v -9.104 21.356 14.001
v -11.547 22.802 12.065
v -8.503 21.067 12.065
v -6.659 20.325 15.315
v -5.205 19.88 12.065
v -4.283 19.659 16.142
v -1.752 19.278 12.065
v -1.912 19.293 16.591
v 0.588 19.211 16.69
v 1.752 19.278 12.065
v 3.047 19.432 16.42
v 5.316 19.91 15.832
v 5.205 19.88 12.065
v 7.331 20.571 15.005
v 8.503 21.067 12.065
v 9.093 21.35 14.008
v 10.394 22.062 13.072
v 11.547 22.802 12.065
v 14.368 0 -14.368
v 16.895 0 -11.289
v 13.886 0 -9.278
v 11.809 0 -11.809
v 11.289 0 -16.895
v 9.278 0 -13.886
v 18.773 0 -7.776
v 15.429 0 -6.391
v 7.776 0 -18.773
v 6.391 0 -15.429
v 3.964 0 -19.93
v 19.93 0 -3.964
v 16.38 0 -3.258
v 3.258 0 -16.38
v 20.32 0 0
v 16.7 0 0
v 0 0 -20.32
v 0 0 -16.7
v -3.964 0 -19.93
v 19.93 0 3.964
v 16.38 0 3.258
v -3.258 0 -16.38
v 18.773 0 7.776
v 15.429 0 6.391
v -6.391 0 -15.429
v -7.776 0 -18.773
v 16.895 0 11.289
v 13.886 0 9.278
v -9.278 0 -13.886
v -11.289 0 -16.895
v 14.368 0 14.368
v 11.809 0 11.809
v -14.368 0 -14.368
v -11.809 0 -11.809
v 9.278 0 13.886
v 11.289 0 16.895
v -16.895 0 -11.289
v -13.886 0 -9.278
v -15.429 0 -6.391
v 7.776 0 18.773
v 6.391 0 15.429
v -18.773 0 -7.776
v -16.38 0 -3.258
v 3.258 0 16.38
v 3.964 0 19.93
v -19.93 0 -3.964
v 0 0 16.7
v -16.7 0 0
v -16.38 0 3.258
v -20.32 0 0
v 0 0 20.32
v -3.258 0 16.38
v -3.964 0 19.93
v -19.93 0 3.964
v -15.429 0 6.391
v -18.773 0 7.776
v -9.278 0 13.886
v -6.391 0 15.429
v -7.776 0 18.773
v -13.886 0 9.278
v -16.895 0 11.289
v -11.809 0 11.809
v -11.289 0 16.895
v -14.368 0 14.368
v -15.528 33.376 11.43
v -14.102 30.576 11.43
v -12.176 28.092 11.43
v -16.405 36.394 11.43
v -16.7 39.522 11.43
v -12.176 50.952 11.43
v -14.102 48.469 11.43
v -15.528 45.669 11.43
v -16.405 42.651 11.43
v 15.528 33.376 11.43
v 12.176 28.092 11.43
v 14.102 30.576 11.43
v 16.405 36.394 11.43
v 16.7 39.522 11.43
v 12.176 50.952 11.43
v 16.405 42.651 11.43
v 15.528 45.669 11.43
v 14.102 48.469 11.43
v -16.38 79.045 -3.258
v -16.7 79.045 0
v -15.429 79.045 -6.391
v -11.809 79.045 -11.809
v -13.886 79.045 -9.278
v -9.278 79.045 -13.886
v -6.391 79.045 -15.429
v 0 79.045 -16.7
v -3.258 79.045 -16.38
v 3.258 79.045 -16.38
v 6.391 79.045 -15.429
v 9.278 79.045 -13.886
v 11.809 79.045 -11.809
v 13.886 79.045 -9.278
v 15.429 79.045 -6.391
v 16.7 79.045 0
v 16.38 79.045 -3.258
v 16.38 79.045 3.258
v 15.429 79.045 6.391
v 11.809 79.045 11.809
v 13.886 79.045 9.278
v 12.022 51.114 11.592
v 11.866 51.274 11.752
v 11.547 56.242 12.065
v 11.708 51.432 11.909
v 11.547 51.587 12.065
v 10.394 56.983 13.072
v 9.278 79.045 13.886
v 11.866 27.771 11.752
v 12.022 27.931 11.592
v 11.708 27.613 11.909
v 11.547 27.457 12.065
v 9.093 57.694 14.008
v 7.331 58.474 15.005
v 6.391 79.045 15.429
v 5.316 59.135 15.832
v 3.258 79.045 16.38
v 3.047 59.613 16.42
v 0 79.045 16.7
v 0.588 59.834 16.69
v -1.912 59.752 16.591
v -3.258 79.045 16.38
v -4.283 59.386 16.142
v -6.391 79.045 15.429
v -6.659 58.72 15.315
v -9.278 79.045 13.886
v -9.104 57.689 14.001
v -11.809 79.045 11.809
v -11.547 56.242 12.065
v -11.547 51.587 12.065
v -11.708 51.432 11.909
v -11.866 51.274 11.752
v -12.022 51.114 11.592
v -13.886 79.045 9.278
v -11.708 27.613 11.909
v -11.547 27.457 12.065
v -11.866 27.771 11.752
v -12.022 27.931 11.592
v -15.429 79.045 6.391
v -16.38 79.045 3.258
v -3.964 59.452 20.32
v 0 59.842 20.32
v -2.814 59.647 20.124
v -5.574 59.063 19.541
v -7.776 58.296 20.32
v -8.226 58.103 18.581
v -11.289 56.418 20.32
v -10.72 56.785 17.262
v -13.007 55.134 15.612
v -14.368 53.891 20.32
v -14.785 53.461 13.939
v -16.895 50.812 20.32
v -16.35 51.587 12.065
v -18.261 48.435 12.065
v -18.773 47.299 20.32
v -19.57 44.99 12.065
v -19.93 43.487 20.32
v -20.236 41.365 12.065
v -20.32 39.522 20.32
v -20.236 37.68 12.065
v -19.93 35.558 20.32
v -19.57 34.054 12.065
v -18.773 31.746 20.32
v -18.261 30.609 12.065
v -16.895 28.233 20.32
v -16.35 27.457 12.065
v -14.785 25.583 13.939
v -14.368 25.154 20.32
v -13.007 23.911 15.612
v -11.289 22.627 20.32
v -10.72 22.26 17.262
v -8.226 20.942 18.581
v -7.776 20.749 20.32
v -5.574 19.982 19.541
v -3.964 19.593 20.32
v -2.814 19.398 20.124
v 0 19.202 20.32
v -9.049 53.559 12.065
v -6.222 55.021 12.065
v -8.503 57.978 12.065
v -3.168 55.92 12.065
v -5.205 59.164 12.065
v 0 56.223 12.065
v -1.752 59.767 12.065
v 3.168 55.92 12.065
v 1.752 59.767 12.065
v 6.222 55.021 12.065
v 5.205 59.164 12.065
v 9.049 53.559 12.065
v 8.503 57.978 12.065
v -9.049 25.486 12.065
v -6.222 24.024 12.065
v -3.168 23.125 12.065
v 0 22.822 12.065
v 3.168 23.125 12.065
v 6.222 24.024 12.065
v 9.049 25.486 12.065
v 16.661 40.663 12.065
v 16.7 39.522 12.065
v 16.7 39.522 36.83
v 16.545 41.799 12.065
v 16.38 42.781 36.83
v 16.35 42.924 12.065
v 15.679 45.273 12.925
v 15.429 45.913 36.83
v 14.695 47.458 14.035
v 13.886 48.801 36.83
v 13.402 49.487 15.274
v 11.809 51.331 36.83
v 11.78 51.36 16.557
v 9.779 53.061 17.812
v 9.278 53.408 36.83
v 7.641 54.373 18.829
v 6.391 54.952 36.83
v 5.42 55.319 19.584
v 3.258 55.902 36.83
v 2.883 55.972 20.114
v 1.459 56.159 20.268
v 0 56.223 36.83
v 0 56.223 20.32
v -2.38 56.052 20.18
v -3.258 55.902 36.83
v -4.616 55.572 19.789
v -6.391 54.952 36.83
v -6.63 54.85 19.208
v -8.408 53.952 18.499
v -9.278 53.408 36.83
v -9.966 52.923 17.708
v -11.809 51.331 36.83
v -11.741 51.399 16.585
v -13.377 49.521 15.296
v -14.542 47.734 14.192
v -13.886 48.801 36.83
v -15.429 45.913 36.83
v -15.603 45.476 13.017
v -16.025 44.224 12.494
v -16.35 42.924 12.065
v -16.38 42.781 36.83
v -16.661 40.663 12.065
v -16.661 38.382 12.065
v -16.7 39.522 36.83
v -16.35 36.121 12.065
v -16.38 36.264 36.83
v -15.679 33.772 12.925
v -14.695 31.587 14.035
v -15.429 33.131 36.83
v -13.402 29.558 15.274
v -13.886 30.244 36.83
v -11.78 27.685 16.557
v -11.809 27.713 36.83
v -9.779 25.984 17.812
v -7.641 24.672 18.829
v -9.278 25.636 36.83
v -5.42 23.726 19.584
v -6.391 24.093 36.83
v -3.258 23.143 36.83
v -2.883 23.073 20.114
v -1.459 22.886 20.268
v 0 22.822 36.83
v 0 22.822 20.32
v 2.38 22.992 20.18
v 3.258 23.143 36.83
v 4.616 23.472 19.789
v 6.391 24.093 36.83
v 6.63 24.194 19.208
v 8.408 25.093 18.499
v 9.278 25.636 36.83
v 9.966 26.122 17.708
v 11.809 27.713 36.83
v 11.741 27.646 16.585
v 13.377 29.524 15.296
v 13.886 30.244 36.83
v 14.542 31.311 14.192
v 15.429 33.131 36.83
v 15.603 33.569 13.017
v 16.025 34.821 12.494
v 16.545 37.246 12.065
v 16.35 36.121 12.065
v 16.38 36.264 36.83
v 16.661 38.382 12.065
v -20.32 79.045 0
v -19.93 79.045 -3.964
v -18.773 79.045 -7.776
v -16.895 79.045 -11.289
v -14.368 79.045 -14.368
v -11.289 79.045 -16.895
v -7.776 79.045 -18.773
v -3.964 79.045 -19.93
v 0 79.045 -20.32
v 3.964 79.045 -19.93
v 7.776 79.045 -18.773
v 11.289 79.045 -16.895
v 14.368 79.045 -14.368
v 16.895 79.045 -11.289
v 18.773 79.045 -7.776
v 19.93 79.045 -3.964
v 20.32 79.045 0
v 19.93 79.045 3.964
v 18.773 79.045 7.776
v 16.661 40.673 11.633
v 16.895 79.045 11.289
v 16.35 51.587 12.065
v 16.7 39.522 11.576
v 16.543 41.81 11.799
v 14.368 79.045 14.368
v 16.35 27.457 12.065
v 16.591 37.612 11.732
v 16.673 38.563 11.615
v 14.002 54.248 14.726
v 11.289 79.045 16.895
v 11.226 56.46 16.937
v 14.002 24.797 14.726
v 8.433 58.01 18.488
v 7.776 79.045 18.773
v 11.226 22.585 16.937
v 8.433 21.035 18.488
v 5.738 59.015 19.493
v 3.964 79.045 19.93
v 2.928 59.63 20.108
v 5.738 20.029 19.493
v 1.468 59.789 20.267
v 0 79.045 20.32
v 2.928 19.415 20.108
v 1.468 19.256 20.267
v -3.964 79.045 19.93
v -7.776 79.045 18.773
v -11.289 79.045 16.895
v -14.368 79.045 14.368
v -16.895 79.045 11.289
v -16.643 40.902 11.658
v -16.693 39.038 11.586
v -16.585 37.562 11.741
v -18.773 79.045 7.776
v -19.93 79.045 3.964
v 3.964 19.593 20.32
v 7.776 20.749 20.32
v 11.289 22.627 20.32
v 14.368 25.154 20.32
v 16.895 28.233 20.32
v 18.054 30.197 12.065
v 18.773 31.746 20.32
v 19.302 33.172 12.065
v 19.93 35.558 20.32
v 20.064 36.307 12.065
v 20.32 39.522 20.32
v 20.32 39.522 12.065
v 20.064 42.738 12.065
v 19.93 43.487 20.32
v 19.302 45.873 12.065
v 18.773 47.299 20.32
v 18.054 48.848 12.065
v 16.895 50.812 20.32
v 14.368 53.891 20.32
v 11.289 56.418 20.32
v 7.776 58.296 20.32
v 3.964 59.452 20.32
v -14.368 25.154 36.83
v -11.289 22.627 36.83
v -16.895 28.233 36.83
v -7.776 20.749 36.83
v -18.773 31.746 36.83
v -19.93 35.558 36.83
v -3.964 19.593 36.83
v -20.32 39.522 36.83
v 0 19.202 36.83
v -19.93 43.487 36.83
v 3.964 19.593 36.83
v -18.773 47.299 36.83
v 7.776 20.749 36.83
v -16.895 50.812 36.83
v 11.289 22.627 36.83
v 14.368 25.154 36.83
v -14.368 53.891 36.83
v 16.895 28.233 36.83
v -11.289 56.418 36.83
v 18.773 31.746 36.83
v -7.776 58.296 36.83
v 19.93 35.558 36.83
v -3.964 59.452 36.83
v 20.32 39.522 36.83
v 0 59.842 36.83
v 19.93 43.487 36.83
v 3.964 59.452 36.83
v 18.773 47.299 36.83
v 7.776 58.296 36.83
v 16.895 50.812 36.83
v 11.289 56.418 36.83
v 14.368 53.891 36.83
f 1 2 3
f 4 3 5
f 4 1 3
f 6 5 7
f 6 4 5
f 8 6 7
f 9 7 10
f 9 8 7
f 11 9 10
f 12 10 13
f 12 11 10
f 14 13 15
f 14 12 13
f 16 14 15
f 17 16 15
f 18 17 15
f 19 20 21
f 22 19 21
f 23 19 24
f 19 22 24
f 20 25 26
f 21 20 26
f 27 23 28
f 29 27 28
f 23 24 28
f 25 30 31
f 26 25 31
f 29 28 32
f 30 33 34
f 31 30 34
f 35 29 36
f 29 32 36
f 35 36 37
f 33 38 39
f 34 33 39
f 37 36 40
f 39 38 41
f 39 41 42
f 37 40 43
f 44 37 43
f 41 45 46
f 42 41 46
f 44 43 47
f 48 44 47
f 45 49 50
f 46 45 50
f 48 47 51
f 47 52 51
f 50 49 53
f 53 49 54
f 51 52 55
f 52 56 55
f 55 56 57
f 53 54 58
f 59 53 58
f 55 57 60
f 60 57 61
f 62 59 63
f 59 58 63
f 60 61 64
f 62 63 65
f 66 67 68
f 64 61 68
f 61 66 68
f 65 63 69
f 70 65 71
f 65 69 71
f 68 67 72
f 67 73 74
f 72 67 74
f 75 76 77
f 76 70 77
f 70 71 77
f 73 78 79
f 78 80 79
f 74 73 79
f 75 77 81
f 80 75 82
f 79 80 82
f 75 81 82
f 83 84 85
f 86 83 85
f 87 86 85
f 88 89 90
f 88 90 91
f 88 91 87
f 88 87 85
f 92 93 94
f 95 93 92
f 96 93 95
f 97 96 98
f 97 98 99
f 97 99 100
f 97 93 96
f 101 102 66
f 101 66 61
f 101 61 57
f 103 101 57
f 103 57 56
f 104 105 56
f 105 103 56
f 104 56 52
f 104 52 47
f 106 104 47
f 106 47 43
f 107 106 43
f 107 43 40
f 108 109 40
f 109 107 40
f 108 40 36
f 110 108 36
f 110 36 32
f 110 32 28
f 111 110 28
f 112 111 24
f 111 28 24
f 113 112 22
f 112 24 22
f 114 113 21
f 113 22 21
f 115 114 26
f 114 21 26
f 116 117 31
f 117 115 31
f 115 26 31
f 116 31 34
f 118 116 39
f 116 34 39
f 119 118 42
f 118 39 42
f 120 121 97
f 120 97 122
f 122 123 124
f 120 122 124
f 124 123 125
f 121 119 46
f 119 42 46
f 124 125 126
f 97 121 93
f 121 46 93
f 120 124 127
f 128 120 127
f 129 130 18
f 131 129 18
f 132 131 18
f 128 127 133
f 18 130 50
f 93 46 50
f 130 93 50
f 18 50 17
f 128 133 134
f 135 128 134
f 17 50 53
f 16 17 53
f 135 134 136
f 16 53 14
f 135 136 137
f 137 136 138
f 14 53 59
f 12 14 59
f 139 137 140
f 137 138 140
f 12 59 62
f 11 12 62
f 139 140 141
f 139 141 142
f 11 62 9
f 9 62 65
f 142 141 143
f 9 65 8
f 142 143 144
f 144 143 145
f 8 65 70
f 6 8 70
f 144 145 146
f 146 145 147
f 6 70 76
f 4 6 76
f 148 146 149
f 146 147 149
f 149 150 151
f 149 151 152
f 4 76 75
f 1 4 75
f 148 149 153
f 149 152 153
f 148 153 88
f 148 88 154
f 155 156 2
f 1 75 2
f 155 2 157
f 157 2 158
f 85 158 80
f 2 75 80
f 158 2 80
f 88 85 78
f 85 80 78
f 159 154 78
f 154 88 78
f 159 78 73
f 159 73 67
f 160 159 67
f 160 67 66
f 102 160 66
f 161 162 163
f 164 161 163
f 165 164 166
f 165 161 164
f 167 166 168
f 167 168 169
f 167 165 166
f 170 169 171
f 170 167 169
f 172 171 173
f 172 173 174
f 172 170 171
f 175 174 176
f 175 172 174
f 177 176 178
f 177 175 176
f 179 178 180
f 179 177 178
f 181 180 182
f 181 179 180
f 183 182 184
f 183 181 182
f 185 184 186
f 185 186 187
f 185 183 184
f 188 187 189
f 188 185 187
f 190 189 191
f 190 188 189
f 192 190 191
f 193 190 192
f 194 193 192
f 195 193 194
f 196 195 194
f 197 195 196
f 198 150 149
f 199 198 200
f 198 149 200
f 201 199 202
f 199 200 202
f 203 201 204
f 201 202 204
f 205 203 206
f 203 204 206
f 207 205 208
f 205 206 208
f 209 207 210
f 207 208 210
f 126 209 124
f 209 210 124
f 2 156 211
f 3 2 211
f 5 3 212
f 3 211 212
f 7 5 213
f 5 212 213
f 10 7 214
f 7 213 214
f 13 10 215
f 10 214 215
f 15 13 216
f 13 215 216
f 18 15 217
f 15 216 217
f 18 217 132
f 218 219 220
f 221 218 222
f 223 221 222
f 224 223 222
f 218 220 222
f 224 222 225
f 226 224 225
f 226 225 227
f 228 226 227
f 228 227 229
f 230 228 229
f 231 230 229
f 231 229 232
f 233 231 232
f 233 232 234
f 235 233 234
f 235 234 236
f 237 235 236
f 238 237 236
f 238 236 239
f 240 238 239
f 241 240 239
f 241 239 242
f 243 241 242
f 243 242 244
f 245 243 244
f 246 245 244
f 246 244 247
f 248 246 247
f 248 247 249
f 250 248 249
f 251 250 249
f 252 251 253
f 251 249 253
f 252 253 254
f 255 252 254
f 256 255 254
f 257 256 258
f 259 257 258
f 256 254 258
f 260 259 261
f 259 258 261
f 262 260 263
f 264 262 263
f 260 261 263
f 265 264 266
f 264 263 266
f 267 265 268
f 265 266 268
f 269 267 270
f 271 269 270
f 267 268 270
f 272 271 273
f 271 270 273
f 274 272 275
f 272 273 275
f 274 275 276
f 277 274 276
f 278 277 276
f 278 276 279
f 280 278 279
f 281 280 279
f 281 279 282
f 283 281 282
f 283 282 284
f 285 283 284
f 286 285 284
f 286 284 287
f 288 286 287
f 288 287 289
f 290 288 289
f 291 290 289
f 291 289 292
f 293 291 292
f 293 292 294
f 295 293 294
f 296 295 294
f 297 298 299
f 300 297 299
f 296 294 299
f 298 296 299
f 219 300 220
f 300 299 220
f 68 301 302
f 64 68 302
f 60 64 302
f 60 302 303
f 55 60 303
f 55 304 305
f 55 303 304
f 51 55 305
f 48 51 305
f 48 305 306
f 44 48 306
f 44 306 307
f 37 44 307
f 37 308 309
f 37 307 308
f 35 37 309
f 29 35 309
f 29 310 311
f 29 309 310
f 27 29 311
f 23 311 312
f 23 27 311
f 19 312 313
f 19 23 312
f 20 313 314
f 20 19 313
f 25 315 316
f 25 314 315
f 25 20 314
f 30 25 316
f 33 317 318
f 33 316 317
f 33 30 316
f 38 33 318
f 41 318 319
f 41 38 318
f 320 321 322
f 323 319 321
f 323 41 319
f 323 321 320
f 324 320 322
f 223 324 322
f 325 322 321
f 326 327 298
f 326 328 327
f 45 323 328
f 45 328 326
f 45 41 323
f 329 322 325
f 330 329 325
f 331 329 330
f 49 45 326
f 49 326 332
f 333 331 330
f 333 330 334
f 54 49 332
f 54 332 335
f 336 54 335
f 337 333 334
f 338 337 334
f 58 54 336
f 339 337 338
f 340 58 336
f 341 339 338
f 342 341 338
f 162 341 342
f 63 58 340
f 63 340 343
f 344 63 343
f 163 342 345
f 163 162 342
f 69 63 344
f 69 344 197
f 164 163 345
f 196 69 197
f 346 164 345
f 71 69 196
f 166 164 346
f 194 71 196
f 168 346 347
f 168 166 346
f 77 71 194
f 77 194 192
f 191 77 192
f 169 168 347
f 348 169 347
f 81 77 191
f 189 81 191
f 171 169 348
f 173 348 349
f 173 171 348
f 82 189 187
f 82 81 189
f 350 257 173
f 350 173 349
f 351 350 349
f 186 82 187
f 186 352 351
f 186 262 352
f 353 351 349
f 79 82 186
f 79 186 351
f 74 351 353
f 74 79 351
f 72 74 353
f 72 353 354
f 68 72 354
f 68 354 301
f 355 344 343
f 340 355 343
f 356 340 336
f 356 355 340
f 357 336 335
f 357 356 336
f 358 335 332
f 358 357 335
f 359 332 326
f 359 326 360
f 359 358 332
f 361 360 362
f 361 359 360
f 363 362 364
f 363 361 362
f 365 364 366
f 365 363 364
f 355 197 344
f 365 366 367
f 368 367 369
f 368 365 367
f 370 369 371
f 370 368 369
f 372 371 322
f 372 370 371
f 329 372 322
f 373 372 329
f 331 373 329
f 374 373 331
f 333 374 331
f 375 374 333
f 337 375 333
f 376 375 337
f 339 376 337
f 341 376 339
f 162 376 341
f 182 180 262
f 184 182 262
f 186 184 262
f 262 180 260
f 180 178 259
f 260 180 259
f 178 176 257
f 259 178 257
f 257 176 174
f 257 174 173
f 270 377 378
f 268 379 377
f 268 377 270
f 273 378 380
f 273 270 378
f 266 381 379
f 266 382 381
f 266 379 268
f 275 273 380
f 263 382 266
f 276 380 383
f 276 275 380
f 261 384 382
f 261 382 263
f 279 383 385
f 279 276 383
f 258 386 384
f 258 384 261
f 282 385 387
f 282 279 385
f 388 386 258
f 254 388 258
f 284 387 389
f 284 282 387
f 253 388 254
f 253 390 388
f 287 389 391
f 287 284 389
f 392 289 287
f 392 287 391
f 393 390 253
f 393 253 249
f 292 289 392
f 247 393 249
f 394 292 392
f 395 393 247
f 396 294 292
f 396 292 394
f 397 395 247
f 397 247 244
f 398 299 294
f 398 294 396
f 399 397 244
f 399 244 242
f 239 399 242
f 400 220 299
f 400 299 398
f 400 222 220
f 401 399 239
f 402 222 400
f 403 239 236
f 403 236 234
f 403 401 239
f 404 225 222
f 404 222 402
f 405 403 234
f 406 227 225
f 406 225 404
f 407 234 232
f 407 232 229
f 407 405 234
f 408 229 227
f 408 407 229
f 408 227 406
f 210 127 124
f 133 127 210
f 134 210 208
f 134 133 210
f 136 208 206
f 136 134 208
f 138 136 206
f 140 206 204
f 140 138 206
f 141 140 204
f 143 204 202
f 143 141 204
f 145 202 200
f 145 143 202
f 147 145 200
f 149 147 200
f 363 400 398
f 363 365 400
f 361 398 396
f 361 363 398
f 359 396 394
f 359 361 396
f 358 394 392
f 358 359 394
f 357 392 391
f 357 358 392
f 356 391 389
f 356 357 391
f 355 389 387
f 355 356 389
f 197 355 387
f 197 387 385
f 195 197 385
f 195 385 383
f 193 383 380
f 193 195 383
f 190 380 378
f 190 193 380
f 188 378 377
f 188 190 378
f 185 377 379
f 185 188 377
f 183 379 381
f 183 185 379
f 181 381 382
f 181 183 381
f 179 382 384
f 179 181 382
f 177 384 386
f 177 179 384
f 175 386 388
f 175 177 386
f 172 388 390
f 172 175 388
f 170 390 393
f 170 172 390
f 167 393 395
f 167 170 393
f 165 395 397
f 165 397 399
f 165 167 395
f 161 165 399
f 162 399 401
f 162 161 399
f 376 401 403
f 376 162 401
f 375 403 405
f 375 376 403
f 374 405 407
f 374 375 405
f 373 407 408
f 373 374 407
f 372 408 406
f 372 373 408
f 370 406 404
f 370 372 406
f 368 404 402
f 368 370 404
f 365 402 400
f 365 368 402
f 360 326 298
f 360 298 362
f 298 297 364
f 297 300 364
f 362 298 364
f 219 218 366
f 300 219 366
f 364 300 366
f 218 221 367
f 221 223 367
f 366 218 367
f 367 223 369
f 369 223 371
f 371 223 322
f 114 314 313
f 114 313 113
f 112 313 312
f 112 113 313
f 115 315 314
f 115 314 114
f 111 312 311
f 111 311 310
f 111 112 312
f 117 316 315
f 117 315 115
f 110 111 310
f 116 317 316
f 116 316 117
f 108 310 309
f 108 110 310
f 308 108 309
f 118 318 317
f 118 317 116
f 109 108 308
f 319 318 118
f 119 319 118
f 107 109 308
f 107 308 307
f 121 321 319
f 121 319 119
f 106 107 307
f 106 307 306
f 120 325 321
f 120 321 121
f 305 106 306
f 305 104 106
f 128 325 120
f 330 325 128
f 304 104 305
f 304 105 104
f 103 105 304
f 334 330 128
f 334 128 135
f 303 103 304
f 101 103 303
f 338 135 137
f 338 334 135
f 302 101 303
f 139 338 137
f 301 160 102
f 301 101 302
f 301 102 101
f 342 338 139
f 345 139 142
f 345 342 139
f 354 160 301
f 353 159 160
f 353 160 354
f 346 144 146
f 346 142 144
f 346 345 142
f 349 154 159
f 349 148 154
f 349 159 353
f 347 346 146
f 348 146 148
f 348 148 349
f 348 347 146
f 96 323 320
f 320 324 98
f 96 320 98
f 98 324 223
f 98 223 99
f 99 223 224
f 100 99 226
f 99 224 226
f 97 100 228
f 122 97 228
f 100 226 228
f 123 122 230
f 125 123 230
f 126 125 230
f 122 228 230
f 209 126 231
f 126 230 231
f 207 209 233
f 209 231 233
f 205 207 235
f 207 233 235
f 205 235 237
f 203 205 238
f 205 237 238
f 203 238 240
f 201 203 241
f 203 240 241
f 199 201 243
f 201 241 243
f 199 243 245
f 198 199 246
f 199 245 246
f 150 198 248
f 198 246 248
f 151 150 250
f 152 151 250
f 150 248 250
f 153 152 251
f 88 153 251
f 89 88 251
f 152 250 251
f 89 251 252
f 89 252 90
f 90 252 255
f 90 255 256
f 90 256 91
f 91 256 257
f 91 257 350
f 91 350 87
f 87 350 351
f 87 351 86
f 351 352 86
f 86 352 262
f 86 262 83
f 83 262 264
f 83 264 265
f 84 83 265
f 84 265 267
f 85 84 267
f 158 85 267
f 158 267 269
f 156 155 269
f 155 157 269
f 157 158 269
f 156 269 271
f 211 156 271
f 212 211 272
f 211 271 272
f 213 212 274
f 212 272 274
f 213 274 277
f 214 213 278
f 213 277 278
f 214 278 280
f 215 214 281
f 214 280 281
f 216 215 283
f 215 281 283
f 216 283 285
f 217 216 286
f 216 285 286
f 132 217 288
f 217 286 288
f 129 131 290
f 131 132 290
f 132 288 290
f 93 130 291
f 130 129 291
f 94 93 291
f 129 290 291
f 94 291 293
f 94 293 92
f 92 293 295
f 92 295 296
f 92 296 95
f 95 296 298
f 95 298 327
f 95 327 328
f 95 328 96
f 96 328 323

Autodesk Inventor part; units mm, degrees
ref_plane "YZ Plane" through (0, 0, 0) normal (1, 0, 0) x (0, 1, 0)
ref_plane "XZ Plane" through (0, 0, 0) normal (0, 1, 0) x (-1, 0, 0)
sketch "Sketch1" plane through (0, 0, 0) normal (0, 1, 0) x (-1, 0, 0)
  circle A0 centre (0, 0) radius 20.32
  circle A1 centre (0, 0) radius 16.7005
  dimension "d0" = 40.64
  dimension "d1" = 33.401
extrude "Extrusion1" add sketch "Sketch1" along normal blind 79.0448
ref_plane "Work Plane1" through (0, 0, 20.32) normal (0, 0, 1) x (1, 0, 0)
sketch "Sketch2" plane through (0, 0, 20.32) normal (0, 0, 1) x (1, 0, 0)
  line L0 (0, 0) -> (0, 79.0448)
  line L1 (20.32, 79.0448) -> (-20.32, 79.0448) projected
  line L2 (-20.32, 0) -> (-20.32, 79.0448) projected
  line L3 (-20.32, 39.5224) -> (20.32, 39.5224)
  line L4 (20.32, 0) -> (20.32, 79.0448) projected
  circle A0 centre (0, 39.5224) radius 16.7005
  circle A1 centre (0, 39.5224) radius 20.32
  dimension "d4" = 33.401
  dimension "d5" = 40.64
extrude "Extrusion2" add sketch "Sketch2" along normal blind 16.51 and the other way blind 8.255 contours A1 L3 A0 L0 | L0 A0 L3 A1 | A1 L0 A0 L3 | L3 A0 L0 A1
sketch "Sketch3" plane through (0, 39.5224, 36.83) normal (0, 0, 1) x (1, 0, 0)
  circle A0 centre (0, 0) radius 16.7005
  point P0 (0, -39.5224)
  dimension "d10" = 33.401
extrude "Extrusion3" cut sketch "Sketch3" against normal blind 25.4
properties part number "New Elbow"
